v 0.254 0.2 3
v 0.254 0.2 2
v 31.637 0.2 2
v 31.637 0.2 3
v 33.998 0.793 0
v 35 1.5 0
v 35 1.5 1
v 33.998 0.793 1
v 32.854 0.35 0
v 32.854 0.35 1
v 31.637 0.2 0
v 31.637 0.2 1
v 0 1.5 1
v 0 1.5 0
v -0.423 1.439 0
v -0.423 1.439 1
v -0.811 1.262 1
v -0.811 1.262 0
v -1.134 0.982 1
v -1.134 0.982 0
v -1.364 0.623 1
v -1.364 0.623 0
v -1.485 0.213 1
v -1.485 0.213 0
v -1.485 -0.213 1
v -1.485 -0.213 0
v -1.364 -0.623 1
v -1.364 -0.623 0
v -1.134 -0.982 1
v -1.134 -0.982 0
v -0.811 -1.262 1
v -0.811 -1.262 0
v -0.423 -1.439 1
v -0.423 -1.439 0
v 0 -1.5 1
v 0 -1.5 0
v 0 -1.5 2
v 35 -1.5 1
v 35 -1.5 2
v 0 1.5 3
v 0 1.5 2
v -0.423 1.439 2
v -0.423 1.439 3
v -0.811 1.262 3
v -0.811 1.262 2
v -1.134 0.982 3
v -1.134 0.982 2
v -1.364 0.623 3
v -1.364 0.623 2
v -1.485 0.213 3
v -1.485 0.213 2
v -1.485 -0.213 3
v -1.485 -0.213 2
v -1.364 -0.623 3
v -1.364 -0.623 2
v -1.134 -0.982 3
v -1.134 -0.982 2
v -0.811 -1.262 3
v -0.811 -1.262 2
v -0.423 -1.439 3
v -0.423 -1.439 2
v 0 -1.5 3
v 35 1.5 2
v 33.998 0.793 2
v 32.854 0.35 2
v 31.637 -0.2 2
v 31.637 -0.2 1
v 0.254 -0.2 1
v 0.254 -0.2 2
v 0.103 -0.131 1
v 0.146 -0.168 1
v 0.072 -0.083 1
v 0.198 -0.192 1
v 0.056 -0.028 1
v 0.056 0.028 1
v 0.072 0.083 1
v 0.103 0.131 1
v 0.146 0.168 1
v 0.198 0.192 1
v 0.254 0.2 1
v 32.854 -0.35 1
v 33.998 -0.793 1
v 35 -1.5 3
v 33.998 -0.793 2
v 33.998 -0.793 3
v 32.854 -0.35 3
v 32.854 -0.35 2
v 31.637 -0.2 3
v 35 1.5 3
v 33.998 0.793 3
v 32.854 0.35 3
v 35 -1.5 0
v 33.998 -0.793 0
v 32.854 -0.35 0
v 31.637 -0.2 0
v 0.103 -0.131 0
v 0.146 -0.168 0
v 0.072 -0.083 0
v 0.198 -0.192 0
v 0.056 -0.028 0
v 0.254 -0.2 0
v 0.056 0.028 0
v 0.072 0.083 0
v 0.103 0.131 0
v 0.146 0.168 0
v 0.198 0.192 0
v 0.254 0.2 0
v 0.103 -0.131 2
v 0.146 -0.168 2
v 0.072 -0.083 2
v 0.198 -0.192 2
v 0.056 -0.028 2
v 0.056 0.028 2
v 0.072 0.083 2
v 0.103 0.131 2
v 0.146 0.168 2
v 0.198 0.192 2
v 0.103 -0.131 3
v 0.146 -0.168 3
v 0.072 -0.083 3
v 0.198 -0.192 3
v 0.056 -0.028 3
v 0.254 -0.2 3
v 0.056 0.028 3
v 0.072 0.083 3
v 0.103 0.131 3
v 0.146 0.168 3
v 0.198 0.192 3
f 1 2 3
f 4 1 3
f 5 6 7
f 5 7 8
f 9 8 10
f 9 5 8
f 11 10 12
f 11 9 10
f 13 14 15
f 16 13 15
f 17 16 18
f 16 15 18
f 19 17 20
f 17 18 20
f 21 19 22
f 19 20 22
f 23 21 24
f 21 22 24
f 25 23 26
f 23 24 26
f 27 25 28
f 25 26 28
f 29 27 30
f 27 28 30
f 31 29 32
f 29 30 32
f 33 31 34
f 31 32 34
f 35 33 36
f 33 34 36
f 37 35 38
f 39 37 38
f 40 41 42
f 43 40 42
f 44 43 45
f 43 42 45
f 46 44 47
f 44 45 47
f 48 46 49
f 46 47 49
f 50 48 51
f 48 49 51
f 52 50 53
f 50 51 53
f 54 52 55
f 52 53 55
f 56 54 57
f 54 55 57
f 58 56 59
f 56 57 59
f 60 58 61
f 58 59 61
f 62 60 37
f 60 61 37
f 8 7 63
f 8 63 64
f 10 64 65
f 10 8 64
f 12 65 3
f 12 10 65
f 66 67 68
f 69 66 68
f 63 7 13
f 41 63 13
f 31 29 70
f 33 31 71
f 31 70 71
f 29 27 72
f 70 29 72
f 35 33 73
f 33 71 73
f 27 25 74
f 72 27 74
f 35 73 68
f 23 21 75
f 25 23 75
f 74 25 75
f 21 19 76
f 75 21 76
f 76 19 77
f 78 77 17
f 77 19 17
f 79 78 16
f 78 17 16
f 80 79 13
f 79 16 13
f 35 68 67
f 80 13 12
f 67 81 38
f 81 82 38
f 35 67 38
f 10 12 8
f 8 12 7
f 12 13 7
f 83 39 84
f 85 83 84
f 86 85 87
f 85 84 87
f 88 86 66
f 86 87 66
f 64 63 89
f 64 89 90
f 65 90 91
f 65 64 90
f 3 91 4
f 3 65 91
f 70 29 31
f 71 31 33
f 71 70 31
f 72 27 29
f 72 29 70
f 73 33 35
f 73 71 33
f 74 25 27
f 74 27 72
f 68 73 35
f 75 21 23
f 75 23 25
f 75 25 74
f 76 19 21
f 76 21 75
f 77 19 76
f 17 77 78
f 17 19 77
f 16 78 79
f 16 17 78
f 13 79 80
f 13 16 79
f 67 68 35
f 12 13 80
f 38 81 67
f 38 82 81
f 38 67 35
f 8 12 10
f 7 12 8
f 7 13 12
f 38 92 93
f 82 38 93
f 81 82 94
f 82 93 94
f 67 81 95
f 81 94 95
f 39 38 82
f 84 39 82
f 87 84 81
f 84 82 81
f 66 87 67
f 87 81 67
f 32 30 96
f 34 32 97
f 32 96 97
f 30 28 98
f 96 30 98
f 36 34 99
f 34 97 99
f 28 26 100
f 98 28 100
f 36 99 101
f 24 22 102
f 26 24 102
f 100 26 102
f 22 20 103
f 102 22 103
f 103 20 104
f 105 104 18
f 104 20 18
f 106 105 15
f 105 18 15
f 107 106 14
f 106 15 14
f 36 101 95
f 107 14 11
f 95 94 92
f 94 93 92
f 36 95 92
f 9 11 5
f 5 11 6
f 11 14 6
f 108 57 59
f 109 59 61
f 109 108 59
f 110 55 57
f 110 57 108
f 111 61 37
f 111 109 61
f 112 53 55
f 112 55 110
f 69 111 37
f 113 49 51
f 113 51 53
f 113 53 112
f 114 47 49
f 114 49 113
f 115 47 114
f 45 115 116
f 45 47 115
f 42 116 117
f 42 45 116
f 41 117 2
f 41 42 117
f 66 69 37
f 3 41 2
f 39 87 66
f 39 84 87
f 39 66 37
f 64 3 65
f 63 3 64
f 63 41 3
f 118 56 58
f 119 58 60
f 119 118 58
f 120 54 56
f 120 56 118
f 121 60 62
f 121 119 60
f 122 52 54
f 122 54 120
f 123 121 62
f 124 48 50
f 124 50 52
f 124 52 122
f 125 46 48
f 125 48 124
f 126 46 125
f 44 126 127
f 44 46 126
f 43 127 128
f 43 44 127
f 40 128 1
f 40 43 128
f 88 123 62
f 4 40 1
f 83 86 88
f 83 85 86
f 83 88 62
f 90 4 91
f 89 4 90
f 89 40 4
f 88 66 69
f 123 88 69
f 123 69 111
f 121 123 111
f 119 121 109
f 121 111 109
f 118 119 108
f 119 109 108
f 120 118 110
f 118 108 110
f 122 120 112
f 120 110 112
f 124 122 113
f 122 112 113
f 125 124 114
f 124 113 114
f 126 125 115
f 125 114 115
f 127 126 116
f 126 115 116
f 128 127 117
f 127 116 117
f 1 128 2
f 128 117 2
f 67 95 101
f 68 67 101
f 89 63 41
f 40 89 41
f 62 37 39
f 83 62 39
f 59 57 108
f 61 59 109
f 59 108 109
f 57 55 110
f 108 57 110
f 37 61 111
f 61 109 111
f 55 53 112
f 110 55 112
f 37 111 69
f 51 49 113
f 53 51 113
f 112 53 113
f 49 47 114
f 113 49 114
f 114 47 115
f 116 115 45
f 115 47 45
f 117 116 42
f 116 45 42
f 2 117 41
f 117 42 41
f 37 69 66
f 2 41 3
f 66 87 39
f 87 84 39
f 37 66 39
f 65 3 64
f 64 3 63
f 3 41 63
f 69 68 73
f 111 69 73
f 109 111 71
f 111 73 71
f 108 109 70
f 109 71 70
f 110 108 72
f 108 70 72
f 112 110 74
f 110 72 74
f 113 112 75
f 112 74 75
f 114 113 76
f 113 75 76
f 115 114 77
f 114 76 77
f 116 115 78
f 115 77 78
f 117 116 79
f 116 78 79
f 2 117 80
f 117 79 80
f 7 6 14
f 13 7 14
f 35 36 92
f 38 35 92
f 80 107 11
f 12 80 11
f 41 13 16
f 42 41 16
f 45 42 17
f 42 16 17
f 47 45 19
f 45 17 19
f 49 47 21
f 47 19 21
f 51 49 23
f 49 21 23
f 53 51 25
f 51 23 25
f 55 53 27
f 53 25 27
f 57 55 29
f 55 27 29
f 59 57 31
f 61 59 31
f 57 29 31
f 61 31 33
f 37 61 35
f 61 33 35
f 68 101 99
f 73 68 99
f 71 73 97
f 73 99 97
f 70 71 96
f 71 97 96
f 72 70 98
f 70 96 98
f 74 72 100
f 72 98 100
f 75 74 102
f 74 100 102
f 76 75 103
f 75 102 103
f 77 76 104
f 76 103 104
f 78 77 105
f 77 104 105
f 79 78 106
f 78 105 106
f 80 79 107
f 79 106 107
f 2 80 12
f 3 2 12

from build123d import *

# Parameters (mm, degrees)
F1_DEPTH      = 1
F2_DEPTH      = 1
F3_DEPTH      = 1
F4_T1_DEPTH   = 17.8151717208
F4_2_T1_DEPTH = 17.8151717208
F4_3_T1_DEPTH = 17.8151717208


# Not quite as in the source:
# - a fillet or chamfer that OpenCascade refuses, or shapes differently, is made with other operations: its cross-section is extruded or revolved along the edge and cut away or added


with BuildPart() as f1:
    # F0 (on Top) → F1 (new body)
    with BuildSketch(Plane.XY):
        with BuildLine():
            Line((35, 1.5), (0, 1.5))
            ThreePointArc((0, 1.5), (-1.5, 0), (0, -1.5))
            Line((0, -1.5), (35, -1.5))
            Line((35, -1.5), (35, -0.2))
            Line((35, -0.2), (0.254249986, -0.2))
            ThreePointArc((0.254249986, -0.2), (0.054249986, 0), (0.254249986, 0.2))
            Line((0.254249986, 0.2), (35, 0.2))
            Line((35, 0.2), (35, 1.5))
        make_face()
    extrude(amount=F1_DEPTH)


with BuildPart() as f2:
    # F2 (new): a face of the model
    f2_faces = [f1.part.faces().sort_by_distance(p)[0] for p in [
        (34.6337691985, 0.85, 1),
    ]]
    extrude(f2_faces, amount=F2_DEPTH)


with BuildPart() as f3:
    # F3 (new): a face of the model
    f3_faces = [f2.part.faces().sort_by_distance(p)[0] for p in [
        (34.6337691985, 0.85, 2),
    ]]
    extrude(f3_faces, amount=F3_DEPTH)

    # F4#3: fillet of radius 5 on 2 edges, made by hand

    # F4_3_s2 → F4_3_t1 (cut)
    with BuildSketch(Plane.XY.offset(-6.4075858604)):
        with BuildLine():
            ThreePointArc((35, -1.5), (33.4397412936, -0.5363104735), (31.6369656558, -0.2))
            Line((31.6369656558, -0.2), (35, -0.2))
            Line((35, -0.2), (35, -1.5))
        make_face()
        with BuildLine():
            ThreePointArc((35, 1.5), (33.4397412936, 0.5363104735), (31.6369656558, 0.2))
            Line((31.6369656558, 0.2), (35, 0.2))
            Line((35, 0.2), (35, 1.5))
        make_face()
    extrude(amount=F4_3_T1_DEPTH, mode=Mode.SUBTRACT)


with BuildPart() as f1_1:
    add(f1.part)

    # F4: fillet of radius 5 on 2 edges, made by hand

    # F4_s2 → F4_t1 (cut)
    with BuildSketch(Plane.XY.offset(-8.4075858604)):
        with BuildLine():
            ThreePointArc((35, 1.5), (33.4397412936, 0.5363104735), (31.6369656558, 0.2))
            Line((31.6369656558, 0.2), (35, 0.2))
            Line((35, 0.2), (35, 1.5))
        make_face()
        with BuildLine():
            ThreePointArc((35, -1.5), (33.4397412936, -0.5363104735), (31.6369656558, -0.2))
            Line((31.6369656558, -0.2), (35, -0.2))
            Line((35, -0.2), (35, -1.5))
        make_face()
    extrude(amount=F4_T1_DEPTH, mode=Mode.SUBTRACT)


with BuildPart() as f2_1:
    add(f2.part)

    # F4#2: fillet of radius 5 on 2 edges, made by hand

    # F4_2_s2 → F4_2_t1 (cut)
    with BuildSketch(Plane.XY.offset(-7.4075858604)):
        with BuildLine():
            ThreePointArc((35, 1.5), (33.4397412936, 0.5363104735), (31.6369656558, 0.2))
            Line((31.6369656558, 0.2), (35, 0.2))
            Line((35, 0.2), (35, 1.5))
        make_face()
        with BuildLine():
            ThreePointArc((35, -1.5), (33.4397412936, -0.5363104735), (31.6369656558, -0.2))
            Line((31.6369656558, -0.2), (35, -0.2))
            Line((35, -0.2), (35, -1.5))
        make_face()
    extrude(amount=F4_2_T1_DEPTH, mode=Mode.SUBTRACT)


solid = Compound([f3.part, f1_1.part, f2_1.part])
